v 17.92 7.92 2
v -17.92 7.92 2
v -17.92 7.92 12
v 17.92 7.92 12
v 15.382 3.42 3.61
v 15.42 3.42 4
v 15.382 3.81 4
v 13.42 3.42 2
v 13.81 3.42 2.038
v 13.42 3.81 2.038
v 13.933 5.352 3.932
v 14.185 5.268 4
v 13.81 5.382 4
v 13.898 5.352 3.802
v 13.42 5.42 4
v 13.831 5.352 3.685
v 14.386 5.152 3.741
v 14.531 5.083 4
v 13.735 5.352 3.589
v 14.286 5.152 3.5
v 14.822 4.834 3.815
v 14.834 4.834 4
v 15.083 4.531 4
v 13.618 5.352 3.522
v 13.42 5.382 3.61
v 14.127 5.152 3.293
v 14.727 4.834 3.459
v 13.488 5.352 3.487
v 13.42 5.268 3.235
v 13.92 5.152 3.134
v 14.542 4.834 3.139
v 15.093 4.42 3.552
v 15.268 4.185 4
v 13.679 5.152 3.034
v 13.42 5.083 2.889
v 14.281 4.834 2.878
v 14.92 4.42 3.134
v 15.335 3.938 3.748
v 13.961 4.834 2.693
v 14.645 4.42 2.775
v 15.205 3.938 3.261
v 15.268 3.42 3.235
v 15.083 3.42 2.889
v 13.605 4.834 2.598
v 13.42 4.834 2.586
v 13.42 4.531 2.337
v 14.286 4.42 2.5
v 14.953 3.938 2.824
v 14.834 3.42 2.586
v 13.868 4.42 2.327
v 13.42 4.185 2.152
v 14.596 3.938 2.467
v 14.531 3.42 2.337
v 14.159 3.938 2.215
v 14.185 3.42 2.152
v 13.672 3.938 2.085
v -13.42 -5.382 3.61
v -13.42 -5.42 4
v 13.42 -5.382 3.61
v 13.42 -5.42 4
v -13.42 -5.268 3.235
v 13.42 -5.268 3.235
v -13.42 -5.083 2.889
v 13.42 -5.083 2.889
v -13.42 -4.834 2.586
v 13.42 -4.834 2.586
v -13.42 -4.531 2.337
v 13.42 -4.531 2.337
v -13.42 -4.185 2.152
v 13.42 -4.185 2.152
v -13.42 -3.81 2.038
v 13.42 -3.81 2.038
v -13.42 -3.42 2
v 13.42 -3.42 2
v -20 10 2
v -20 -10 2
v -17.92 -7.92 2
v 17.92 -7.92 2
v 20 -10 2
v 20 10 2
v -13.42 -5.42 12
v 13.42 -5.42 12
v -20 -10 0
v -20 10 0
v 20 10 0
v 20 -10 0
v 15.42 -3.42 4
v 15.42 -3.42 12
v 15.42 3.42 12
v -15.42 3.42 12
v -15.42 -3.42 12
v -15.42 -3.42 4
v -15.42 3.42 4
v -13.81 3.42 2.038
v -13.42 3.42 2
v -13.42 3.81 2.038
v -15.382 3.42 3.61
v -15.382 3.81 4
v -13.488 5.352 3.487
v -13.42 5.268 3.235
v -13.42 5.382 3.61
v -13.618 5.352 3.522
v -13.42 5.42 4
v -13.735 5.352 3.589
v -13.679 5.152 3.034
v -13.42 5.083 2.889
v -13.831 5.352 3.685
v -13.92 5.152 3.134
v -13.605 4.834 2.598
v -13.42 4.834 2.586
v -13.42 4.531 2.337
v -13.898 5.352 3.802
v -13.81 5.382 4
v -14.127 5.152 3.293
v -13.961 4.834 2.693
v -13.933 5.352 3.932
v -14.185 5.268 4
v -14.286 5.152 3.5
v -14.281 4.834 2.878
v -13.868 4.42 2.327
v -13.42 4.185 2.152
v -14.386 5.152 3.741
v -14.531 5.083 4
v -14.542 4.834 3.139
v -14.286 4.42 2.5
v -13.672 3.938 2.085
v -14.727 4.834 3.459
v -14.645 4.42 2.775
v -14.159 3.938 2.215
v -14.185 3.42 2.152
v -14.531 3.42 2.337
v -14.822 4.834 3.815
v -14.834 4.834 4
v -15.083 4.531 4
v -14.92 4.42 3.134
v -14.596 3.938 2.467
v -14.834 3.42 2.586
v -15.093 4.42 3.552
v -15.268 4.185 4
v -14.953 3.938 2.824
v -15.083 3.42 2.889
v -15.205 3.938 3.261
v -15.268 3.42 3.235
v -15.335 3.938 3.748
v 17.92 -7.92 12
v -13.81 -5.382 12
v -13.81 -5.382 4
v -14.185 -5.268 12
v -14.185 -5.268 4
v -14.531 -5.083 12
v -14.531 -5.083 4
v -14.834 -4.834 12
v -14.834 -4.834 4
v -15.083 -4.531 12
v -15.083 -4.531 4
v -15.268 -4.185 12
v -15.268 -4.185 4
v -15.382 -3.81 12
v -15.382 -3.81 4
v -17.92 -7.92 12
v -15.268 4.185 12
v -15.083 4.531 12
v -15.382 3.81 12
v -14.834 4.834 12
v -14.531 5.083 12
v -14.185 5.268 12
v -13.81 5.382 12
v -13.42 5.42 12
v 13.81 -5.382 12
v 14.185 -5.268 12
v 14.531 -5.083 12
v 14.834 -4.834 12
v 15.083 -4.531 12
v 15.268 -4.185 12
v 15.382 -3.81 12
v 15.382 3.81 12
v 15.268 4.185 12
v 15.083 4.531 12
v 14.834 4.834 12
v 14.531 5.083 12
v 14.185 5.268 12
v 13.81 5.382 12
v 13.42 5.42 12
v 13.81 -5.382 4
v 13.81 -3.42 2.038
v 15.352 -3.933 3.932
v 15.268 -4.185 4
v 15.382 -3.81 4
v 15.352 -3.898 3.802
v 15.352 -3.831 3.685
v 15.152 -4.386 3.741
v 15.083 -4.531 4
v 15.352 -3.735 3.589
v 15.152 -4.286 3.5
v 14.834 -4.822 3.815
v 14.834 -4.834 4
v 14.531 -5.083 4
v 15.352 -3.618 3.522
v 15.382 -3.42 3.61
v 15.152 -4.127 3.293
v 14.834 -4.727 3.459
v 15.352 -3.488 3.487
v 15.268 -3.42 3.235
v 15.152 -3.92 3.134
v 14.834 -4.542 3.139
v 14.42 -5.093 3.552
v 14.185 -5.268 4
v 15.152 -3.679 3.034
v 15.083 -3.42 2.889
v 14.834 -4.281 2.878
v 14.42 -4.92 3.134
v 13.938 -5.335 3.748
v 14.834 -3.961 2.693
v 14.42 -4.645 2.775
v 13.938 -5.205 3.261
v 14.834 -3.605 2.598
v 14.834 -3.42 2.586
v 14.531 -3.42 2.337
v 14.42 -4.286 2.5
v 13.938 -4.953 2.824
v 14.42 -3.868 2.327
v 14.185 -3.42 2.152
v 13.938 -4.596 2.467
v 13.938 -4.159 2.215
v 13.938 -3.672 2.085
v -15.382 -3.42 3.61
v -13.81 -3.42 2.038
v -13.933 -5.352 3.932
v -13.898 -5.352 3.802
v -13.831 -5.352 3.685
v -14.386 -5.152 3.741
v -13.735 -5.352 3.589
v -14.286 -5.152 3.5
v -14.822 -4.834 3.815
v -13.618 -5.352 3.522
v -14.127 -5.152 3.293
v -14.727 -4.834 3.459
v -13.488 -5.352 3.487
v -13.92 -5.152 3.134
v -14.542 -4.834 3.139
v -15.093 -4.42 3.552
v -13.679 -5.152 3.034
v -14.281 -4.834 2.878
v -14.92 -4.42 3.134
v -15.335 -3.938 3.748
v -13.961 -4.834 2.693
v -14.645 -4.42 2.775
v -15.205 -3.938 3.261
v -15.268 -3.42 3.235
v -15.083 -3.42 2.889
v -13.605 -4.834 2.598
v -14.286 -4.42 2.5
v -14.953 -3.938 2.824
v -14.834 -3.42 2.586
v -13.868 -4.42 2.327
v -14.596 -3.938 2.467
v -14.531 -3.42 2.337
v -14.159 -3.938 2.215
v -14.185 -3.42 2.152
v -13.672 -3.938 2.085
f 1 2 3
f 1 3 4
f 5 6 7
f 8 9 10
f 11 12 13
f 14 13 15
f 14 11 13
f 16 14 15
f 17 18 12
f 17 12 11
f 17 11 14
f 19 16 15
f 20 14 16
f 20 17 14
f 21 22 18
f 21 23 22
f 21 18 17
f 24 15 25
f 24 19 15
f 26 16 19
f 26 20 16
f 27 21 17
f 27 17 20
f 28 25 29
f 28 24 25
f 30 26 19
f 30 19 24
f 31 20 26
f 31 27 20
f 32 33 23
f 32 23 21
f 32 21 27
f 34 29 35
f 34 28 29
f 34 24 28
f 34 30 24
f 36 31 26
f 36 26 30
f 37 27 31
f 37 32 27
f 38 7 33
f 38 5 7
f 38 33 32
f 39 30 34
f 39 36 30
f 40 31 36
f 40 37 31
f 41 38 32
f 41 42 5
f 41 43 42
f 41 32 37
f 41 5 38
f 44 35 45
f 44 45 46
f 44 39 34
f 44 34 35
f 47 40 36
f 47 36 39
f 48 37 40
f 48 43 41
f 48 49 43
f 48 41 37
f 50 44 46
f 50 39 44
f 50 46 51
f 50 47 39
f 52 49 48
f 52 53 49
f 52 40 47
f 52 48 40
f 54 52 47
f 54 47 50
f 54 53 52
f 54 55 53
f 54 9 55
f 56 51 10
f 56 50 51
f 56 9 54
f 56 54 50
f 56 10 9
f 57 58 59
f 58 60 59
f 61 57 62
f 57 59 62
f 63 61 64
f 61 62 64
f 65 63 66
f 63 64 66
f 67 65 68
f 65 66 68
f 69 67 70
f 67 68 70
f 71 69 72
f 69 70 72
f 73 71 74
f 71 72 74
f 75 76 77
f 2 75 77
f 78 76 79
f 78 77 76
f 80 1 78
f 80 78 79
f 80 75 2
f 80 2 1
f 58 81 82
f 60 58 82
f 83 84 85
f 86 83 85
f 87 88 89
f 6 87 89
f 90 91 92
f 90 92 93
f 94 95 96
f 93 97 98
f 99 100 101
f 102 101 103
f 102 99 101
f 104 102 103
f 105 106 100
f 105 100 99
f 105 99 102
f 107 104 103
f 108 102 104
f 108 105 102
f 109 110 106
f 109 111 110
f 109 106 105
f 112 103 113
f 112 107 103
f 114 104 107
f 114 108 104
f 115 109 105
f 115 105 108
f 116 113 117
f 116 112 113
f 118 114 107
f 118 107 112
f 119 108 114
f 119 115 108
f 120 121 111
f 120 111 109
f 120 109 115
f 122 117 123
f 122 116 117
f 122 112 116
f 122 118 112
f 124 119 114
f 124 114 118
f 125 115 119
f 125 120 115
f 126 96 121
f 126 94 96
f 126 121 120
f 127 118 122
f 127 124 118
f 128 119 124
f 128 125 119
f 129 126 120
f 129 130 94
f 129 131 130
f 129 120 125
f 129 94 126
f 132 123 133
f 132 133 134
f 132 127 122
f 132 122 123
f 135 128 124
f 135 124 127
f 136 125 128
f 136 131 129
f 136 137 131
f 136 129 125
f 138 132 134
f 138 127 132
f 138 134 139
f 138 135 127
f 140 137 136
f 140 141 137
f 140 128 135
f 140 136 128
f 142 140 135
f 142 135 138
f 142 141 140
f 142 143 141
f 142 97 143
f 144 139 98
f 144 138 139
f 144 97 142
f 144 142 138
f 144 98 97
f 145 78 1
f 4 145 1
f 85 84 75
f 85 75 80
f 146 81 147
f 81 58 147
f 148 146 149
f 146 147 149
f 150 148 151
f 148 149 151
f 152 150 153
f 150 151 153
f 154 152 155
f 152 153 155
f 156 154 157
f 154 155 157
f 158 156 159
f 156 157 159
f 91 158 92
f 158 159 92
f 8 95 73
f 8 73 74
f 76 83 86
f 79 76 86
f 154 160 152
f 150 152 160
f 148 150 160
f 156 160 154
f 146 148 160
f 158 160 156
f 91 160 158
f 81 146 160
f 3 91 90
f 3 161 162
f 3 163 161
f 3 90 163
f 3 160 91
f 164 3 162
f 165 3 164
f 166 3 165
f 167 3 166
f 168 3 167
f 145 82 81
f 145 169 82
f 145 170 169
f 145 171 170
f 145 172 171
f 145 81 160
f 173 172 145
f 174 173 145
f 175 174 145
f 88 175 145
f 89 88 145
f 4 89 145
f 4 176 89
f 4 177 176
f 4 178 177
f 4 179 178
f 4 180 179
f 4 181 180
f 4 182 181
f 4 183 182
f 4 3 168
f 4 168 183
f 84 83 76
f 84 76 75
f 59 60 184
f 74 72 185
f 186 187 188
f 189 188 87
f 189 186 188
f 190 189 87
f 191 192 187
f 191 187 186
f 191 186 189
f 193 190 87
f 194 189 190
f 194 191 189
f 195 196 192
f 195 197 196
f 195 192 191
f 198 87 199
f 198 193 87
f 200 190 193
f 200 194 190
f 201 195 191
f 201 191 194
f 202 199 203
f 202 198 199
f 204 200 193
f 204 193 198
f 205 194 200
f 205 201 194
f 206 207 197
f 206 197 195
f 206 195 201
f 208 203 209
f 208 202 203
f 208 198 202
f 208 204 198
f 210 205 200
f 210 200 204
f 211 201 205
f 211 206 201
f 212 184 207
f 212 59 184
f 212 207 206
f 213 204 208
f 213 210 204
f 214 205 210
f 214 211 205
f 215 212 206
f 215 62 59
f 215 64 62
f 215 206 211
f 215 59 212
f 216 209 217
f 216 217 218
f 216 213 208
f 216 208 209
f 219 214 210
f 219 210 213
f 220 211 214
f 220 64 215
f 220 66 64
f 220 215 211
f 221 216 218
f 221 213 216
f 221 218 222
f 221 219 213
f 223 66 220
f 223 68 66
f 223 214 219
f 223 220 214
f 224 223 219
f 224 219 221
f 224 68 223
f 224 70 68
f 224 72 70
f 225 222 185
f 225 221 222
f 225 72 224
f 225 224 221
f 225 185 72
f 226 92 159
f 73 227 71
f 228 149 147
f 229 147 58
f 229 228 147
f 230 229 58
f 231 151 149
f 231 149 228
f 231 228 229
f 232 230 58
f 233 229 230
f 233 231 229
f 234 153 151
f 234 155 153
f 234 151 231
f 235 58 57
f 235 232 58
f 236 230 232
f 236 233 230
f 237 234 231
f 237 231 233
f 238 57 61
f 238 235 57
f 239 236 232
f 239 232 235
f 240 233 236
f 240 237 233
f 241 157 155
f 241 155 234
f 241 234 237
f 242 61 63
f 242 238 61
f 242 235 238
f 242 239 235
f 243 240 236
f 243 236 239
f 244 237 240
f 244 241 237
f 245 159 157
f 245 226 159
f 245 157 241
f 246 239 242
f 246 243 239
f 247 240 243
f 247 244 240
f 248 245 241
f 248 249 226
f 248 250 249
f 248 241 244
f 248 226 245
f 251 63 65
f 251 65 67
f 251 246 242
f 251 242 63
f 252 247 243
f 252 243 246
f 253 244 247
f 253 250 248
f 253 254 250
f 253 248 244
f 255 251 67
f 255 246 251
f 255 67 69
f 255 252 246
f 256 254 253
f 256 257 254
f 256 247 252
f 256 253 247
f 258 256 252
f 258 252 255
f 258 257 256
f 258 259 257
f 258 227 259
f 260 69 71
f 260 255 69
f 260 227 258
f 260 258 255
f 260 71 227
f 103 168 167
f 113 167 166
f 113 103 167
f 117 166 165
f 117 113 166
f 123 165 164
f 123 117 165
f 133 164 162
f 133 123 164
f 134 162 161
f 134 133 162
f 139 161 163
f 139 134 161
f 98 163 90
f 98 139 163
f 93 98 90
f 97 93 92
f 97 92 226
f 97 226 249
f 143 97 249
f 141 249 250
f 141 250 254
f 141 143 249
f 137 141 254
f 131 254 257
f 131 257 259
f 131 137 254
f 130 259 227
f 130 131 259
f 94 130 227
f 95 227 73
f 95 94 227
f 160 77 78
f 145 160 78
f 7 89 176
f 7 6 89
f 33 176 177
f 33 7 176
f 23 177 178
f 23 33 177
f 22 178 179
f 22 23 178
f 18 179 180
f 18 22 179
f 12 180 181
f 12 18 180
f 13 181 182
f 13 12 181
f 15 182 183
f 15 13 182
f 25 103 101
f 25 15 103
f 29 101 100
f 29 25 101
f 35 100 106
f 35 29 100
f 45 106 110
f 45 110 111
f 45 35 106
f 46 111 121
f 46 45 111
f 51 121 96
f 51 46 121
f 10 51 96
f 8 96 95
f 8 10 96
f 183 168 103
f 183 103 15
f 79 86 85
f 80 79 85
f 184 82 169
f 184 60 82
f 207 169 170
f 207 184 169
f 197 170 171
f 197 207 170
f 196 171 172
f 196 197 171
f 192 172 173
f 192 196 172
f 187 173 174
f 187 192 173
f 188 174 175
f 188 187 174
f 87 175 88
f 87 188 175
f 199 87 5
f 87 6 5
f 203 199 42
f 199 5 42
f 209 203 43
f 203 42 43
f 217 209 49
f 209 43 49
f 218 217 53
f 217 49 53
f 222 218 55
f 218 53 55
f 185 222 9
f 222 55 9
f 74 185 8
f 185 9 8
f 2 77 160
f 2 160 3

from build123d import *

# Parameters (mm, degrees)
SKETCH1_W           = 40
SKETCH1_H           = 20
BOSS_EXTRUDE1_DEPTH = 2
SKETCH2_W           = 35.84
SKETCH2_H           = 15.84
BOSS_EXTRUDE2_DEPTH = 10
SKETCH4_W           = 30.84
SKETCH4_H           = 10.84
CUT_EXTRUDE1_DEPTH  = 10
FILLET1_R           = 2


with BuildPart() as part:
    # Sketch1 → Boss-Extrude1 (new body)
    with BuildSketch(Plane.XY):
        Rectangle(SKETCH1_W, SKETCH1_H)
    extrude(amount=BOSS_EXTRUDE1_DEPTH)

    # Sketch2 → Boss-Extrude2 (add)
    with BuildSketch(Plane.XY.offset(2)):
        Rectangle(SKETCH2_W, SKETCH2_H)
    extrude(amount=BOSS_EXTRUDE2_DEPTH)

    # Sketch4 → Cut-Extrude1 (cut)
    with BuildSketch(Plane.XY.offset(12)):
        Rectangle(SKETCH4_W, SKETCH4_H)
    extrude(amount=-CUT_EXTRUDE1_DEPTH, mode=Mode.SUBTRACT)

    # Fillet1
    fillet1_edges = [part.edges().sort_by_distance(p)[0] for p in [
        (-15.42, 0, 2),
        (-15.42, -5.42, 7),
        (0, -5.42, 2),
        (15.42, -5.42, 7),
        (15.42, 0, 2),
        (15.42, 5.42, 7),
        (0, 5.42, 2),
        (-15.42, 5.42, 7),
    ]]
    fillet(fillet1_edges, radius=FILLET1_R)


solid = part.part
